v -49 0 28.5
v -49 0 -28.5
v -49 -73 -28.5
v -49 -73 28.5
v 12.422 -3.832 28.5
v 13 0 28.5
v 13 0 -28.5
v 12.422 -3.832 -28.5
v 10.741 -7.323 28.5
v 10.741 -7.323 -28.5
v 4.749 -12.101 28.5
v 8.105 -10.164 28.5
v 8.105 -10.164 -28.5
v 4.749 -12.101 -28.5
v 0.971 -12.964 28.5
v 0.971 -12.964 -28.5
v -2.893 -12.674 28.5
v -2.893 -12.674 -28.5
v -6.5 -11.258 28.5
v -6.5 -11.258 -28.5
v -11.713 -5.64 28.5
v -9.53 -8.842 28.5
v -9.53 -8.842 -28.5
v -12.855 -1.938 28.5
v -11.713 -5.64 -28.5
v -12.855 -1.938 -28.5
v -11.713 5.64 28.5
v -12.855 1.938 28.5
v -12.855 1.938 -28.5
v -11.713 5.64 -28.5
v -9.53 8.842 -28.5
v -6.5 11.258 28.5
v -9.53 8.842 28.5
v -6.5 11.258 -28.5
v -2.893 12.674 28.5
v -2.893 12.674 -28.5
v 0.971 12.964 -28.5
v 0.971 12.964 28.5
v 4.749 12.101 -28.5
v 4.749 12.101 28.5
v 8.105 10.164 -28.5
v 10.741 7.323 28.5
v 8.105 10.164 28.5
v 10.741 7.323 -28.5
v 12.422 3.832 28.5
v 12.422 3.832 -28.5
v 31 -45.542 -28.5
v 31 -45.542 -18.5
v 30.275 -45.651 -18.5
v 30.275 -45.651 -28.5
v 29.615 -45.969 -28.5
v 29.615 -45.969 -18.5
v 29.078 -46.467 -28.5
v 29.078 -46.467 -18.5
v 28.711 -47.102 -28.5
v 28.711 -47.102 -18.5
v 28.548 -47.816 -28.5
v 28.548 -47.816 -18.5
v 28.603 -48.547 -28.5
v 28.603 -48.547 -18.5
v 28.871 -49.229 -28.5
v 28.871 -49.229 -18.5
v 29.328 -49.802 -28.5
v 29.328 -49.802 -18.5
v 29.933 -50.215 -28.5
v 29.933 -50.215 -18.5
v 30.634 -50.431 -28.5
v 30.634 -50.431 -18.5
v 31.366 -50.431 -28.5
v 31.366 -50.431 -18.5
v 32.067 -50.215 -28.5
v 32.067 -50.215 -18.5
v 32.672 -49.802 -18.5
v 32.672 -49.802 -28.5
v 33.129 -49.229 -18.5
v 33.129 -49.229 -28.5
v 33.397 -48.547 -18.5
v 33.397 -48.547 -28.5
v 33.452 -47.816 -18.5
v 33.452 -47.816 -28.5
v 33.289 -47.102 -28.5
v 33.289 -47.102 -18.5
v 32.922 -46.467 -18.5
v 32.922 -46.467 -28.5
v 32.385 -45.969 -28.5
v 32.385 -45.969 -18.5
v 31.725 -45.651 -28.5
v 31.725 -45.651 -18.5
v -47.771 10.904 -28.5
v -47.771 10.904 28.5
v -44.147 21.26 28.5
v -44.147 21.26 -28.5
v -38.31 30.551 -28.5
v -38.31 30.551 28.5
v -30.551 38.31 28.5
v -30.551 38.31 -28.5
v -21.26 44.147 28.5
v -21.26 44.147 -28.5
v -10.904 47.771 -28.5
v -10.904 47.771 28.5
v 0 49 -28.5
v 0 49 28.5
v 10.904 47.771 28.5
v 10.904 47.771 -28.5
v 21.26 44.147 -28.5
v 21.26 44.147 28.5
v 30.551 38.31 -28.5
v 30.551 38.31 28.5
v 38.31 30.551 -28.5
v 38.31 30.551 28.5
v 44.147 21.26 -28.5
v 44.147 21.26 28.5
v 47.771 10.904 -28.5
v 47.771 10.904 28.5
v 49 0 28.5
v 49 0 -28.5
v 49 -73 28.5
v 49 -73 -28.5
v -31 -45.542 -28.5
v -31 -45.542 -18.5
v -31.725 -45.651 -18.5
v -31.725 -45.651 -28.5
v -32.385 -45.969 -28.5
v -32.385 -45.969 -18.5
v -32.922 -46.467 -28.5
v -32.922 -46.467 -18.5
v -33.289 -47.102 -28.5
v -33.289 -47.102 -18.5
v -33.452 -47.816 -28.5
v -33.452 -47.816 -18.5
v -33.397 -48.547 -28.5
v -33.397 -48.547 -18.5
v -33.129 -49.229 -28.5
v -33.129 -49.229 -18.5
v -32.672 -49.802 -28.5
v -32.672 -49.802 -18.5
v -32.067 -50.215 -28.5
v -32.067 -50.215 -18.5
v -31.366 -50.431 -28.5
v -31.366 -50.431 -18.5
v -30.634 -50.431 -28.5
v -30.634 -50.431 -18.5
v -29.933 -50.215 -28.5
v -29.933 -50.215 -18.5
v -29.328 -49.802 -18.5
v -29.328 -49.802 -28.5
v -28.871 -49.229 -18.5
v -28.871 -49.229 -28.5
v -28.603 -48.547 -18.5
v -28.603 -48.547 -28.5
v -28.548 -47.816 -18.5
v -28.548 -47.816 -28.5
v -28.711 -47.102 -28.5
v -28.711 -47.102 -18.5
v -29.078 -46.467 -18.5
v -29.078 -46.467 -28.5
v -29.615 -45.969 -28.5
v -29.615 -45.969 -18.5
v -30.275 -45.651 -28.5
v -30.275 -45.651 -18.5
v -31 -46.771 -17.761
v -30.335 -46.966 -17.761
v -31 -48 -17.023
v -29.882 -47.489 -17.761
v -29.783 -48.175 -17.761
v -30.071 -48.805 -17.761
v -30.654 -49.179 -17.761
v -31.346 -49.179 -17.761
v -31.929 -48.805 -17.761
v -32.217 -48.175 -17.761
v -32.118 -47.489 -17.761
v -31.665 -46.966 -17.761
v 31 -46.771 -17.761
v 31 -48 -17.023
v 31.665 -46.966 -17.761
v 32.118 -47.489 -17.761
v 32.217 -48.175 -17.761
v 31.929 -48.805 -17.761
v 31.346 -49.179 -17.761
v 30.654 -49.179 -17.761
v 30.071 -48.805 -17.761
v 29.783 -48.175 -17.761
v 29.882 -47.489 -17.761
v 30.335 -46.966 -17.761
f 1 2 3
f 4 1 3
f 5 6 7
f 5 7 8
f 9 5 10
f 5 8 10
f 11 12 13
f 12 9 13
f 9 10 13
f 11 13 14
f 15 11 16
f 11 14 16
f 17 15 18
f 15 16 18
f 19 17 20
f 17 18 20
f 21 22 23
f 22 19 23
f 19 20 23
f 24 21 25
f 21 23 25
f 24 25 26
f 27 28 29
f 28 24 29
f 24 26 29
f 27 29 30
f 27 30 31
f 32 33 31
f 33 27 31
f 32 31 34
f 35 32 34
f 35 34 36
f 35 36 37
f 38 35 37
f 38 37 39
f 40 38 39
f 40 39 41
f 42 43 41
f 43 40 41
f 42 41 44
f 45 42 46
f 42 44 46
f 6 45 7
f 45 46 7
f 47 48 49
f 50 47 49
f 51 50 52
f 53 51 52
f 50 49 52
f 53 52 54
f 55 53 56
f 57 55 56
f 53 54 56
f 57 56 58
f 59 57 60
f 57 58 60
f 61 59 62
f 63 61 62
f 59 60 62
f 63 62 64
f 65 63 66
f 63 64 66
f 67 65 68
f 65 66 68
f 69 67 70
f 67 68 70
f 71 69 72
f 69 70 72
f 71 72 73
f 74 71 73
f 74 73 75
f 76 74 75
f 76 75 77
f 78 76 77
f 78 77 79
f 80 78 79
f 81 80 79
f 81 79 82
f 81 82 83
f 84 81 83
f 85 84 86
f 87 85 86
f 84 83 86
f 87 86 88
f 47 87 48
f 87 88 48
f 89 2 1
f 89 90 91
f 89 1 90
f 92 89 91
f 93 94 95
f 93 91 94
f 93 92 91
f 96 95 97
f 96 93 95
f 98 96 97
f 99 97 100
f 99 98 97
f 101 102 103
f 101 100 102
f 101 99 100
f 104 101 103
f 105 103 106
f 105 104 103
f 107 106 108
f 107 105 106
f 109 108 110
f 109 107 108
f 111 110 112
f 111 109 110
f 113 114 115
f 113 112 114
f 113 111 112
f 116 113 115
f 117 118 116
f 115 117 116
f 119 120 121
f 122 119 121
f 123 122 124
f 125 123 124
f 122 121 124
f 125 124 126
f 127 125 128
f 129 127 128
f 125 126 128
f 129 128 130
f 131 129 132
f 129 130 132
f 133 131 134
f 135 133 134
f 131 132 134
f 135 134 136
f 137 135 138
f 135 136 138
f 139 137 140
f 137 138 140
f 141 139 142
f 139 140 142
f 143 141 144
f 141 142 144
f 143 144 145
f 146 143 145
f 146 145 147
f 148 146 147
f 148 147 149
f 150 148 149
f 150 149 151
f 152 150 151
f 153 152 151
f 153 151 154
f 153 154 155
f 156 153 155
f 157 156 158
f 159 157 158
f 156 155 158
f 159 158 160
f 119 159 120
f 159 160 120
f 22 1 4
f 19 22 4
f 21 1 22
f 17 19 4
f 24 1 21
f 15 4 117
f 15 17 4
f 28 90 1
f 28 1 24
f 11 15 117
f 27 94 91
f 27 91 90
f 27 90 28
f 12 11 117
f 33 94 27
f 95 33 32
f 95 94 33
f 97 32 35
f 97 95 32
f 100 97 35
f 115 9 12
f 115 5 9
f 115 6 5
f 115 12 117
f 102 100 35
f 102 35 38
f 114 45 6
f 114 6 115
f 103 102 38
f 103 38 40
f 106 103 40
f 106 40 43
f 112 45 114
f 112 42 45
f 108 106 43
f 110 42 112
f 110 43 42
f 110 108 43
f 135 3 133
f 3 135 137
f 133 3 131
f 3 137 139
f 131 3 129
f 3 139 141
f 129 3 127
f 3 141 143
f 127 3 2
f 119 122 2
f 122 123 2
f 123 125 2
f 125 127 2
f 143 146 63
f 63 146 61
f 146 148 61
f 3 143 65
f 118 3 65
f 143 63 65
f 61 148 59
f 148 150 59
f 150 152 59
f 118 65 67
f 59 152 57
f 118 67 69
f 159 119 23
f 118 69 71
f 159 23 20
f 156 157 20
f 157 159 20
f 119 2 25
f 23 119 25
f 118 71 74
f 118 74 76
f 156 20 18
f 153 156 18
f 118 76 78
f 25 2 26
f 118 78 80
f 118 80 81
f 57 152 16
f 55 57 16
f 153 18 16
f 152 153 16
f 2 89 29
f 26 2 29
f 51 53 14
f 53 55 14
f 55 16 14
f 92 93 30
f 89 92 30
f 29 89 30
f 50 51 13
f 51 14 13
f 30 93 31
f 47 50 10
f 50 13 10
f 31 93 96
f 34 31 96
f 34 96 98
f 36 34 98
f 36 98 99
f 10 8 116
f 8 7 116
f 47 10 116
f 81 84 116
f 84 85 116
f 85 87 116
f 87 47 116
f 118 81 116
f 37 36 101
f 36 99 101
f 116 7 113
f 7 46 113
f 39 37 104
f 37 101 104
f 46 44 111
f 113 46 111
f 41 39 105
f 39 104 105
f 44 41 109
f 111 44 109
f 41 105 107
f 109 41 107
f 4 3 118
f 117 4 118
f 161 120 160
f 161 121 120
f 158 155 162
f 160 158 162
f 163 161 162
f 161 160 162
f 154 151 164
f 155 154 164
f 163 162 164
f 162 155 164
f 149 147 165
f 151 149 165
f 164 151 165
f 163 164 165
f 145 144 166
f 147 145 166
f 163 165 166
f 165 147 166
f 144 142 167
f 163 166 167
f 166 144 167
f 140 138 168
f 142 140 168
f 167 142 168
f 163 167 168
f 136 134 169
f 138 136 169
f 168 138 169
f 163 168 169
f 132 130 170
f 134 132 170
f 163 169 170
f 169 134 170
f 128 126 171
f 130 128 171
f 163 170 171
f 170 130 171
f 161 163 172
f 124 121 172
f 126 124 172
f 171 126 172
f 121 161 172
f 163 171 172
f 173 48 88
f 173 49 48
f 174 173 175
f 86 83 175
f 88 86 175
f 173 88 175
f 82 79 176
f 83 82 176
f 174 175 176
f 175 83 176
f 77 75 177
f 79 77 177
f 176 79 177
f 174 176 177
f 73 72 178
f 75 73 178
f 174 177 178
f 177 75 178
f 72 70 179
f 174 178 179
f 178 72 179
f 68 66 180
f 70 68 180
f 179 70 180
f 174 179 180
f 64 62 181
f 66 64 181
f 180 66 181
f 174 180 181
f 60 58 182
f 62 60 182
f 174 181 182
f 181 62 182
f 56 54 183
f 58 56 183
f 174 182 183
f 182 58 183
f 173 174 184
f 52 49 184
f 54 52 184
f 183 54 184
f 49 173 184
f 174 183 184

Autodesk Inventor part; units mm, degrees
ref_plane "YZ Plane" through (0, 0, 0) normal (1, 0, 0) x (0, 1, 0)
ref_plane "XZ Plane" through (0, 0, 0) normal (0, 1, 0) x (-1, 0, 0)
ref_plane "XY Plane" through (0, 0, 0) normal (0, 0, 1) x (1, 0, 0)
sketch "Sketch1" plane through (0, 0, 0) normal (0, 0, 1) x (1, 0, 0)
  line L0 (0, 73.4) -> (0, -97.4) construction
  line L1 (-68.6, 0) -> (68.6, 0) construction
  circle A0 centre (0, 0) radius 13
  arc A1 (49, 0) -> (-49, 0) centre (0, 0) ccw
  line L2 (-49, 0) -> (-49, -73)
  line L3 (-49, -73) -> (49, -73)
  line L4 (49, -73) -> (49, 0)
  dimension "d0" = 26
  dimension "d1" = 49
  dimension "d2" = 73
extrude "Extrusion1" add sketch "Sketch1" along normal mid plane 57
sketch "Sketch2" plane through (0, 0, -28.5) normal (0, 0, -1) x (-1, 0, 0)
  line L0 (-49, -73) -> (49, -73) projected
  point P0 (0, 0)
  point P1 (31, -48)
  point P2 (-31, -48)
  dimension "d5" = 31
  dimension "d6" = 31
  dimension "d7" = 25
hole "Hole1" at (-31, -48, -28.5) at (31, -48, -28.5) direction (0, 0, 1) diameter 4.917 depth 10 tip angle 118 thread size "M6x1" class "6H" standard "ISO Metric profile"
equation "\"d6\" = d5"
properties part number "Current_transducer"
